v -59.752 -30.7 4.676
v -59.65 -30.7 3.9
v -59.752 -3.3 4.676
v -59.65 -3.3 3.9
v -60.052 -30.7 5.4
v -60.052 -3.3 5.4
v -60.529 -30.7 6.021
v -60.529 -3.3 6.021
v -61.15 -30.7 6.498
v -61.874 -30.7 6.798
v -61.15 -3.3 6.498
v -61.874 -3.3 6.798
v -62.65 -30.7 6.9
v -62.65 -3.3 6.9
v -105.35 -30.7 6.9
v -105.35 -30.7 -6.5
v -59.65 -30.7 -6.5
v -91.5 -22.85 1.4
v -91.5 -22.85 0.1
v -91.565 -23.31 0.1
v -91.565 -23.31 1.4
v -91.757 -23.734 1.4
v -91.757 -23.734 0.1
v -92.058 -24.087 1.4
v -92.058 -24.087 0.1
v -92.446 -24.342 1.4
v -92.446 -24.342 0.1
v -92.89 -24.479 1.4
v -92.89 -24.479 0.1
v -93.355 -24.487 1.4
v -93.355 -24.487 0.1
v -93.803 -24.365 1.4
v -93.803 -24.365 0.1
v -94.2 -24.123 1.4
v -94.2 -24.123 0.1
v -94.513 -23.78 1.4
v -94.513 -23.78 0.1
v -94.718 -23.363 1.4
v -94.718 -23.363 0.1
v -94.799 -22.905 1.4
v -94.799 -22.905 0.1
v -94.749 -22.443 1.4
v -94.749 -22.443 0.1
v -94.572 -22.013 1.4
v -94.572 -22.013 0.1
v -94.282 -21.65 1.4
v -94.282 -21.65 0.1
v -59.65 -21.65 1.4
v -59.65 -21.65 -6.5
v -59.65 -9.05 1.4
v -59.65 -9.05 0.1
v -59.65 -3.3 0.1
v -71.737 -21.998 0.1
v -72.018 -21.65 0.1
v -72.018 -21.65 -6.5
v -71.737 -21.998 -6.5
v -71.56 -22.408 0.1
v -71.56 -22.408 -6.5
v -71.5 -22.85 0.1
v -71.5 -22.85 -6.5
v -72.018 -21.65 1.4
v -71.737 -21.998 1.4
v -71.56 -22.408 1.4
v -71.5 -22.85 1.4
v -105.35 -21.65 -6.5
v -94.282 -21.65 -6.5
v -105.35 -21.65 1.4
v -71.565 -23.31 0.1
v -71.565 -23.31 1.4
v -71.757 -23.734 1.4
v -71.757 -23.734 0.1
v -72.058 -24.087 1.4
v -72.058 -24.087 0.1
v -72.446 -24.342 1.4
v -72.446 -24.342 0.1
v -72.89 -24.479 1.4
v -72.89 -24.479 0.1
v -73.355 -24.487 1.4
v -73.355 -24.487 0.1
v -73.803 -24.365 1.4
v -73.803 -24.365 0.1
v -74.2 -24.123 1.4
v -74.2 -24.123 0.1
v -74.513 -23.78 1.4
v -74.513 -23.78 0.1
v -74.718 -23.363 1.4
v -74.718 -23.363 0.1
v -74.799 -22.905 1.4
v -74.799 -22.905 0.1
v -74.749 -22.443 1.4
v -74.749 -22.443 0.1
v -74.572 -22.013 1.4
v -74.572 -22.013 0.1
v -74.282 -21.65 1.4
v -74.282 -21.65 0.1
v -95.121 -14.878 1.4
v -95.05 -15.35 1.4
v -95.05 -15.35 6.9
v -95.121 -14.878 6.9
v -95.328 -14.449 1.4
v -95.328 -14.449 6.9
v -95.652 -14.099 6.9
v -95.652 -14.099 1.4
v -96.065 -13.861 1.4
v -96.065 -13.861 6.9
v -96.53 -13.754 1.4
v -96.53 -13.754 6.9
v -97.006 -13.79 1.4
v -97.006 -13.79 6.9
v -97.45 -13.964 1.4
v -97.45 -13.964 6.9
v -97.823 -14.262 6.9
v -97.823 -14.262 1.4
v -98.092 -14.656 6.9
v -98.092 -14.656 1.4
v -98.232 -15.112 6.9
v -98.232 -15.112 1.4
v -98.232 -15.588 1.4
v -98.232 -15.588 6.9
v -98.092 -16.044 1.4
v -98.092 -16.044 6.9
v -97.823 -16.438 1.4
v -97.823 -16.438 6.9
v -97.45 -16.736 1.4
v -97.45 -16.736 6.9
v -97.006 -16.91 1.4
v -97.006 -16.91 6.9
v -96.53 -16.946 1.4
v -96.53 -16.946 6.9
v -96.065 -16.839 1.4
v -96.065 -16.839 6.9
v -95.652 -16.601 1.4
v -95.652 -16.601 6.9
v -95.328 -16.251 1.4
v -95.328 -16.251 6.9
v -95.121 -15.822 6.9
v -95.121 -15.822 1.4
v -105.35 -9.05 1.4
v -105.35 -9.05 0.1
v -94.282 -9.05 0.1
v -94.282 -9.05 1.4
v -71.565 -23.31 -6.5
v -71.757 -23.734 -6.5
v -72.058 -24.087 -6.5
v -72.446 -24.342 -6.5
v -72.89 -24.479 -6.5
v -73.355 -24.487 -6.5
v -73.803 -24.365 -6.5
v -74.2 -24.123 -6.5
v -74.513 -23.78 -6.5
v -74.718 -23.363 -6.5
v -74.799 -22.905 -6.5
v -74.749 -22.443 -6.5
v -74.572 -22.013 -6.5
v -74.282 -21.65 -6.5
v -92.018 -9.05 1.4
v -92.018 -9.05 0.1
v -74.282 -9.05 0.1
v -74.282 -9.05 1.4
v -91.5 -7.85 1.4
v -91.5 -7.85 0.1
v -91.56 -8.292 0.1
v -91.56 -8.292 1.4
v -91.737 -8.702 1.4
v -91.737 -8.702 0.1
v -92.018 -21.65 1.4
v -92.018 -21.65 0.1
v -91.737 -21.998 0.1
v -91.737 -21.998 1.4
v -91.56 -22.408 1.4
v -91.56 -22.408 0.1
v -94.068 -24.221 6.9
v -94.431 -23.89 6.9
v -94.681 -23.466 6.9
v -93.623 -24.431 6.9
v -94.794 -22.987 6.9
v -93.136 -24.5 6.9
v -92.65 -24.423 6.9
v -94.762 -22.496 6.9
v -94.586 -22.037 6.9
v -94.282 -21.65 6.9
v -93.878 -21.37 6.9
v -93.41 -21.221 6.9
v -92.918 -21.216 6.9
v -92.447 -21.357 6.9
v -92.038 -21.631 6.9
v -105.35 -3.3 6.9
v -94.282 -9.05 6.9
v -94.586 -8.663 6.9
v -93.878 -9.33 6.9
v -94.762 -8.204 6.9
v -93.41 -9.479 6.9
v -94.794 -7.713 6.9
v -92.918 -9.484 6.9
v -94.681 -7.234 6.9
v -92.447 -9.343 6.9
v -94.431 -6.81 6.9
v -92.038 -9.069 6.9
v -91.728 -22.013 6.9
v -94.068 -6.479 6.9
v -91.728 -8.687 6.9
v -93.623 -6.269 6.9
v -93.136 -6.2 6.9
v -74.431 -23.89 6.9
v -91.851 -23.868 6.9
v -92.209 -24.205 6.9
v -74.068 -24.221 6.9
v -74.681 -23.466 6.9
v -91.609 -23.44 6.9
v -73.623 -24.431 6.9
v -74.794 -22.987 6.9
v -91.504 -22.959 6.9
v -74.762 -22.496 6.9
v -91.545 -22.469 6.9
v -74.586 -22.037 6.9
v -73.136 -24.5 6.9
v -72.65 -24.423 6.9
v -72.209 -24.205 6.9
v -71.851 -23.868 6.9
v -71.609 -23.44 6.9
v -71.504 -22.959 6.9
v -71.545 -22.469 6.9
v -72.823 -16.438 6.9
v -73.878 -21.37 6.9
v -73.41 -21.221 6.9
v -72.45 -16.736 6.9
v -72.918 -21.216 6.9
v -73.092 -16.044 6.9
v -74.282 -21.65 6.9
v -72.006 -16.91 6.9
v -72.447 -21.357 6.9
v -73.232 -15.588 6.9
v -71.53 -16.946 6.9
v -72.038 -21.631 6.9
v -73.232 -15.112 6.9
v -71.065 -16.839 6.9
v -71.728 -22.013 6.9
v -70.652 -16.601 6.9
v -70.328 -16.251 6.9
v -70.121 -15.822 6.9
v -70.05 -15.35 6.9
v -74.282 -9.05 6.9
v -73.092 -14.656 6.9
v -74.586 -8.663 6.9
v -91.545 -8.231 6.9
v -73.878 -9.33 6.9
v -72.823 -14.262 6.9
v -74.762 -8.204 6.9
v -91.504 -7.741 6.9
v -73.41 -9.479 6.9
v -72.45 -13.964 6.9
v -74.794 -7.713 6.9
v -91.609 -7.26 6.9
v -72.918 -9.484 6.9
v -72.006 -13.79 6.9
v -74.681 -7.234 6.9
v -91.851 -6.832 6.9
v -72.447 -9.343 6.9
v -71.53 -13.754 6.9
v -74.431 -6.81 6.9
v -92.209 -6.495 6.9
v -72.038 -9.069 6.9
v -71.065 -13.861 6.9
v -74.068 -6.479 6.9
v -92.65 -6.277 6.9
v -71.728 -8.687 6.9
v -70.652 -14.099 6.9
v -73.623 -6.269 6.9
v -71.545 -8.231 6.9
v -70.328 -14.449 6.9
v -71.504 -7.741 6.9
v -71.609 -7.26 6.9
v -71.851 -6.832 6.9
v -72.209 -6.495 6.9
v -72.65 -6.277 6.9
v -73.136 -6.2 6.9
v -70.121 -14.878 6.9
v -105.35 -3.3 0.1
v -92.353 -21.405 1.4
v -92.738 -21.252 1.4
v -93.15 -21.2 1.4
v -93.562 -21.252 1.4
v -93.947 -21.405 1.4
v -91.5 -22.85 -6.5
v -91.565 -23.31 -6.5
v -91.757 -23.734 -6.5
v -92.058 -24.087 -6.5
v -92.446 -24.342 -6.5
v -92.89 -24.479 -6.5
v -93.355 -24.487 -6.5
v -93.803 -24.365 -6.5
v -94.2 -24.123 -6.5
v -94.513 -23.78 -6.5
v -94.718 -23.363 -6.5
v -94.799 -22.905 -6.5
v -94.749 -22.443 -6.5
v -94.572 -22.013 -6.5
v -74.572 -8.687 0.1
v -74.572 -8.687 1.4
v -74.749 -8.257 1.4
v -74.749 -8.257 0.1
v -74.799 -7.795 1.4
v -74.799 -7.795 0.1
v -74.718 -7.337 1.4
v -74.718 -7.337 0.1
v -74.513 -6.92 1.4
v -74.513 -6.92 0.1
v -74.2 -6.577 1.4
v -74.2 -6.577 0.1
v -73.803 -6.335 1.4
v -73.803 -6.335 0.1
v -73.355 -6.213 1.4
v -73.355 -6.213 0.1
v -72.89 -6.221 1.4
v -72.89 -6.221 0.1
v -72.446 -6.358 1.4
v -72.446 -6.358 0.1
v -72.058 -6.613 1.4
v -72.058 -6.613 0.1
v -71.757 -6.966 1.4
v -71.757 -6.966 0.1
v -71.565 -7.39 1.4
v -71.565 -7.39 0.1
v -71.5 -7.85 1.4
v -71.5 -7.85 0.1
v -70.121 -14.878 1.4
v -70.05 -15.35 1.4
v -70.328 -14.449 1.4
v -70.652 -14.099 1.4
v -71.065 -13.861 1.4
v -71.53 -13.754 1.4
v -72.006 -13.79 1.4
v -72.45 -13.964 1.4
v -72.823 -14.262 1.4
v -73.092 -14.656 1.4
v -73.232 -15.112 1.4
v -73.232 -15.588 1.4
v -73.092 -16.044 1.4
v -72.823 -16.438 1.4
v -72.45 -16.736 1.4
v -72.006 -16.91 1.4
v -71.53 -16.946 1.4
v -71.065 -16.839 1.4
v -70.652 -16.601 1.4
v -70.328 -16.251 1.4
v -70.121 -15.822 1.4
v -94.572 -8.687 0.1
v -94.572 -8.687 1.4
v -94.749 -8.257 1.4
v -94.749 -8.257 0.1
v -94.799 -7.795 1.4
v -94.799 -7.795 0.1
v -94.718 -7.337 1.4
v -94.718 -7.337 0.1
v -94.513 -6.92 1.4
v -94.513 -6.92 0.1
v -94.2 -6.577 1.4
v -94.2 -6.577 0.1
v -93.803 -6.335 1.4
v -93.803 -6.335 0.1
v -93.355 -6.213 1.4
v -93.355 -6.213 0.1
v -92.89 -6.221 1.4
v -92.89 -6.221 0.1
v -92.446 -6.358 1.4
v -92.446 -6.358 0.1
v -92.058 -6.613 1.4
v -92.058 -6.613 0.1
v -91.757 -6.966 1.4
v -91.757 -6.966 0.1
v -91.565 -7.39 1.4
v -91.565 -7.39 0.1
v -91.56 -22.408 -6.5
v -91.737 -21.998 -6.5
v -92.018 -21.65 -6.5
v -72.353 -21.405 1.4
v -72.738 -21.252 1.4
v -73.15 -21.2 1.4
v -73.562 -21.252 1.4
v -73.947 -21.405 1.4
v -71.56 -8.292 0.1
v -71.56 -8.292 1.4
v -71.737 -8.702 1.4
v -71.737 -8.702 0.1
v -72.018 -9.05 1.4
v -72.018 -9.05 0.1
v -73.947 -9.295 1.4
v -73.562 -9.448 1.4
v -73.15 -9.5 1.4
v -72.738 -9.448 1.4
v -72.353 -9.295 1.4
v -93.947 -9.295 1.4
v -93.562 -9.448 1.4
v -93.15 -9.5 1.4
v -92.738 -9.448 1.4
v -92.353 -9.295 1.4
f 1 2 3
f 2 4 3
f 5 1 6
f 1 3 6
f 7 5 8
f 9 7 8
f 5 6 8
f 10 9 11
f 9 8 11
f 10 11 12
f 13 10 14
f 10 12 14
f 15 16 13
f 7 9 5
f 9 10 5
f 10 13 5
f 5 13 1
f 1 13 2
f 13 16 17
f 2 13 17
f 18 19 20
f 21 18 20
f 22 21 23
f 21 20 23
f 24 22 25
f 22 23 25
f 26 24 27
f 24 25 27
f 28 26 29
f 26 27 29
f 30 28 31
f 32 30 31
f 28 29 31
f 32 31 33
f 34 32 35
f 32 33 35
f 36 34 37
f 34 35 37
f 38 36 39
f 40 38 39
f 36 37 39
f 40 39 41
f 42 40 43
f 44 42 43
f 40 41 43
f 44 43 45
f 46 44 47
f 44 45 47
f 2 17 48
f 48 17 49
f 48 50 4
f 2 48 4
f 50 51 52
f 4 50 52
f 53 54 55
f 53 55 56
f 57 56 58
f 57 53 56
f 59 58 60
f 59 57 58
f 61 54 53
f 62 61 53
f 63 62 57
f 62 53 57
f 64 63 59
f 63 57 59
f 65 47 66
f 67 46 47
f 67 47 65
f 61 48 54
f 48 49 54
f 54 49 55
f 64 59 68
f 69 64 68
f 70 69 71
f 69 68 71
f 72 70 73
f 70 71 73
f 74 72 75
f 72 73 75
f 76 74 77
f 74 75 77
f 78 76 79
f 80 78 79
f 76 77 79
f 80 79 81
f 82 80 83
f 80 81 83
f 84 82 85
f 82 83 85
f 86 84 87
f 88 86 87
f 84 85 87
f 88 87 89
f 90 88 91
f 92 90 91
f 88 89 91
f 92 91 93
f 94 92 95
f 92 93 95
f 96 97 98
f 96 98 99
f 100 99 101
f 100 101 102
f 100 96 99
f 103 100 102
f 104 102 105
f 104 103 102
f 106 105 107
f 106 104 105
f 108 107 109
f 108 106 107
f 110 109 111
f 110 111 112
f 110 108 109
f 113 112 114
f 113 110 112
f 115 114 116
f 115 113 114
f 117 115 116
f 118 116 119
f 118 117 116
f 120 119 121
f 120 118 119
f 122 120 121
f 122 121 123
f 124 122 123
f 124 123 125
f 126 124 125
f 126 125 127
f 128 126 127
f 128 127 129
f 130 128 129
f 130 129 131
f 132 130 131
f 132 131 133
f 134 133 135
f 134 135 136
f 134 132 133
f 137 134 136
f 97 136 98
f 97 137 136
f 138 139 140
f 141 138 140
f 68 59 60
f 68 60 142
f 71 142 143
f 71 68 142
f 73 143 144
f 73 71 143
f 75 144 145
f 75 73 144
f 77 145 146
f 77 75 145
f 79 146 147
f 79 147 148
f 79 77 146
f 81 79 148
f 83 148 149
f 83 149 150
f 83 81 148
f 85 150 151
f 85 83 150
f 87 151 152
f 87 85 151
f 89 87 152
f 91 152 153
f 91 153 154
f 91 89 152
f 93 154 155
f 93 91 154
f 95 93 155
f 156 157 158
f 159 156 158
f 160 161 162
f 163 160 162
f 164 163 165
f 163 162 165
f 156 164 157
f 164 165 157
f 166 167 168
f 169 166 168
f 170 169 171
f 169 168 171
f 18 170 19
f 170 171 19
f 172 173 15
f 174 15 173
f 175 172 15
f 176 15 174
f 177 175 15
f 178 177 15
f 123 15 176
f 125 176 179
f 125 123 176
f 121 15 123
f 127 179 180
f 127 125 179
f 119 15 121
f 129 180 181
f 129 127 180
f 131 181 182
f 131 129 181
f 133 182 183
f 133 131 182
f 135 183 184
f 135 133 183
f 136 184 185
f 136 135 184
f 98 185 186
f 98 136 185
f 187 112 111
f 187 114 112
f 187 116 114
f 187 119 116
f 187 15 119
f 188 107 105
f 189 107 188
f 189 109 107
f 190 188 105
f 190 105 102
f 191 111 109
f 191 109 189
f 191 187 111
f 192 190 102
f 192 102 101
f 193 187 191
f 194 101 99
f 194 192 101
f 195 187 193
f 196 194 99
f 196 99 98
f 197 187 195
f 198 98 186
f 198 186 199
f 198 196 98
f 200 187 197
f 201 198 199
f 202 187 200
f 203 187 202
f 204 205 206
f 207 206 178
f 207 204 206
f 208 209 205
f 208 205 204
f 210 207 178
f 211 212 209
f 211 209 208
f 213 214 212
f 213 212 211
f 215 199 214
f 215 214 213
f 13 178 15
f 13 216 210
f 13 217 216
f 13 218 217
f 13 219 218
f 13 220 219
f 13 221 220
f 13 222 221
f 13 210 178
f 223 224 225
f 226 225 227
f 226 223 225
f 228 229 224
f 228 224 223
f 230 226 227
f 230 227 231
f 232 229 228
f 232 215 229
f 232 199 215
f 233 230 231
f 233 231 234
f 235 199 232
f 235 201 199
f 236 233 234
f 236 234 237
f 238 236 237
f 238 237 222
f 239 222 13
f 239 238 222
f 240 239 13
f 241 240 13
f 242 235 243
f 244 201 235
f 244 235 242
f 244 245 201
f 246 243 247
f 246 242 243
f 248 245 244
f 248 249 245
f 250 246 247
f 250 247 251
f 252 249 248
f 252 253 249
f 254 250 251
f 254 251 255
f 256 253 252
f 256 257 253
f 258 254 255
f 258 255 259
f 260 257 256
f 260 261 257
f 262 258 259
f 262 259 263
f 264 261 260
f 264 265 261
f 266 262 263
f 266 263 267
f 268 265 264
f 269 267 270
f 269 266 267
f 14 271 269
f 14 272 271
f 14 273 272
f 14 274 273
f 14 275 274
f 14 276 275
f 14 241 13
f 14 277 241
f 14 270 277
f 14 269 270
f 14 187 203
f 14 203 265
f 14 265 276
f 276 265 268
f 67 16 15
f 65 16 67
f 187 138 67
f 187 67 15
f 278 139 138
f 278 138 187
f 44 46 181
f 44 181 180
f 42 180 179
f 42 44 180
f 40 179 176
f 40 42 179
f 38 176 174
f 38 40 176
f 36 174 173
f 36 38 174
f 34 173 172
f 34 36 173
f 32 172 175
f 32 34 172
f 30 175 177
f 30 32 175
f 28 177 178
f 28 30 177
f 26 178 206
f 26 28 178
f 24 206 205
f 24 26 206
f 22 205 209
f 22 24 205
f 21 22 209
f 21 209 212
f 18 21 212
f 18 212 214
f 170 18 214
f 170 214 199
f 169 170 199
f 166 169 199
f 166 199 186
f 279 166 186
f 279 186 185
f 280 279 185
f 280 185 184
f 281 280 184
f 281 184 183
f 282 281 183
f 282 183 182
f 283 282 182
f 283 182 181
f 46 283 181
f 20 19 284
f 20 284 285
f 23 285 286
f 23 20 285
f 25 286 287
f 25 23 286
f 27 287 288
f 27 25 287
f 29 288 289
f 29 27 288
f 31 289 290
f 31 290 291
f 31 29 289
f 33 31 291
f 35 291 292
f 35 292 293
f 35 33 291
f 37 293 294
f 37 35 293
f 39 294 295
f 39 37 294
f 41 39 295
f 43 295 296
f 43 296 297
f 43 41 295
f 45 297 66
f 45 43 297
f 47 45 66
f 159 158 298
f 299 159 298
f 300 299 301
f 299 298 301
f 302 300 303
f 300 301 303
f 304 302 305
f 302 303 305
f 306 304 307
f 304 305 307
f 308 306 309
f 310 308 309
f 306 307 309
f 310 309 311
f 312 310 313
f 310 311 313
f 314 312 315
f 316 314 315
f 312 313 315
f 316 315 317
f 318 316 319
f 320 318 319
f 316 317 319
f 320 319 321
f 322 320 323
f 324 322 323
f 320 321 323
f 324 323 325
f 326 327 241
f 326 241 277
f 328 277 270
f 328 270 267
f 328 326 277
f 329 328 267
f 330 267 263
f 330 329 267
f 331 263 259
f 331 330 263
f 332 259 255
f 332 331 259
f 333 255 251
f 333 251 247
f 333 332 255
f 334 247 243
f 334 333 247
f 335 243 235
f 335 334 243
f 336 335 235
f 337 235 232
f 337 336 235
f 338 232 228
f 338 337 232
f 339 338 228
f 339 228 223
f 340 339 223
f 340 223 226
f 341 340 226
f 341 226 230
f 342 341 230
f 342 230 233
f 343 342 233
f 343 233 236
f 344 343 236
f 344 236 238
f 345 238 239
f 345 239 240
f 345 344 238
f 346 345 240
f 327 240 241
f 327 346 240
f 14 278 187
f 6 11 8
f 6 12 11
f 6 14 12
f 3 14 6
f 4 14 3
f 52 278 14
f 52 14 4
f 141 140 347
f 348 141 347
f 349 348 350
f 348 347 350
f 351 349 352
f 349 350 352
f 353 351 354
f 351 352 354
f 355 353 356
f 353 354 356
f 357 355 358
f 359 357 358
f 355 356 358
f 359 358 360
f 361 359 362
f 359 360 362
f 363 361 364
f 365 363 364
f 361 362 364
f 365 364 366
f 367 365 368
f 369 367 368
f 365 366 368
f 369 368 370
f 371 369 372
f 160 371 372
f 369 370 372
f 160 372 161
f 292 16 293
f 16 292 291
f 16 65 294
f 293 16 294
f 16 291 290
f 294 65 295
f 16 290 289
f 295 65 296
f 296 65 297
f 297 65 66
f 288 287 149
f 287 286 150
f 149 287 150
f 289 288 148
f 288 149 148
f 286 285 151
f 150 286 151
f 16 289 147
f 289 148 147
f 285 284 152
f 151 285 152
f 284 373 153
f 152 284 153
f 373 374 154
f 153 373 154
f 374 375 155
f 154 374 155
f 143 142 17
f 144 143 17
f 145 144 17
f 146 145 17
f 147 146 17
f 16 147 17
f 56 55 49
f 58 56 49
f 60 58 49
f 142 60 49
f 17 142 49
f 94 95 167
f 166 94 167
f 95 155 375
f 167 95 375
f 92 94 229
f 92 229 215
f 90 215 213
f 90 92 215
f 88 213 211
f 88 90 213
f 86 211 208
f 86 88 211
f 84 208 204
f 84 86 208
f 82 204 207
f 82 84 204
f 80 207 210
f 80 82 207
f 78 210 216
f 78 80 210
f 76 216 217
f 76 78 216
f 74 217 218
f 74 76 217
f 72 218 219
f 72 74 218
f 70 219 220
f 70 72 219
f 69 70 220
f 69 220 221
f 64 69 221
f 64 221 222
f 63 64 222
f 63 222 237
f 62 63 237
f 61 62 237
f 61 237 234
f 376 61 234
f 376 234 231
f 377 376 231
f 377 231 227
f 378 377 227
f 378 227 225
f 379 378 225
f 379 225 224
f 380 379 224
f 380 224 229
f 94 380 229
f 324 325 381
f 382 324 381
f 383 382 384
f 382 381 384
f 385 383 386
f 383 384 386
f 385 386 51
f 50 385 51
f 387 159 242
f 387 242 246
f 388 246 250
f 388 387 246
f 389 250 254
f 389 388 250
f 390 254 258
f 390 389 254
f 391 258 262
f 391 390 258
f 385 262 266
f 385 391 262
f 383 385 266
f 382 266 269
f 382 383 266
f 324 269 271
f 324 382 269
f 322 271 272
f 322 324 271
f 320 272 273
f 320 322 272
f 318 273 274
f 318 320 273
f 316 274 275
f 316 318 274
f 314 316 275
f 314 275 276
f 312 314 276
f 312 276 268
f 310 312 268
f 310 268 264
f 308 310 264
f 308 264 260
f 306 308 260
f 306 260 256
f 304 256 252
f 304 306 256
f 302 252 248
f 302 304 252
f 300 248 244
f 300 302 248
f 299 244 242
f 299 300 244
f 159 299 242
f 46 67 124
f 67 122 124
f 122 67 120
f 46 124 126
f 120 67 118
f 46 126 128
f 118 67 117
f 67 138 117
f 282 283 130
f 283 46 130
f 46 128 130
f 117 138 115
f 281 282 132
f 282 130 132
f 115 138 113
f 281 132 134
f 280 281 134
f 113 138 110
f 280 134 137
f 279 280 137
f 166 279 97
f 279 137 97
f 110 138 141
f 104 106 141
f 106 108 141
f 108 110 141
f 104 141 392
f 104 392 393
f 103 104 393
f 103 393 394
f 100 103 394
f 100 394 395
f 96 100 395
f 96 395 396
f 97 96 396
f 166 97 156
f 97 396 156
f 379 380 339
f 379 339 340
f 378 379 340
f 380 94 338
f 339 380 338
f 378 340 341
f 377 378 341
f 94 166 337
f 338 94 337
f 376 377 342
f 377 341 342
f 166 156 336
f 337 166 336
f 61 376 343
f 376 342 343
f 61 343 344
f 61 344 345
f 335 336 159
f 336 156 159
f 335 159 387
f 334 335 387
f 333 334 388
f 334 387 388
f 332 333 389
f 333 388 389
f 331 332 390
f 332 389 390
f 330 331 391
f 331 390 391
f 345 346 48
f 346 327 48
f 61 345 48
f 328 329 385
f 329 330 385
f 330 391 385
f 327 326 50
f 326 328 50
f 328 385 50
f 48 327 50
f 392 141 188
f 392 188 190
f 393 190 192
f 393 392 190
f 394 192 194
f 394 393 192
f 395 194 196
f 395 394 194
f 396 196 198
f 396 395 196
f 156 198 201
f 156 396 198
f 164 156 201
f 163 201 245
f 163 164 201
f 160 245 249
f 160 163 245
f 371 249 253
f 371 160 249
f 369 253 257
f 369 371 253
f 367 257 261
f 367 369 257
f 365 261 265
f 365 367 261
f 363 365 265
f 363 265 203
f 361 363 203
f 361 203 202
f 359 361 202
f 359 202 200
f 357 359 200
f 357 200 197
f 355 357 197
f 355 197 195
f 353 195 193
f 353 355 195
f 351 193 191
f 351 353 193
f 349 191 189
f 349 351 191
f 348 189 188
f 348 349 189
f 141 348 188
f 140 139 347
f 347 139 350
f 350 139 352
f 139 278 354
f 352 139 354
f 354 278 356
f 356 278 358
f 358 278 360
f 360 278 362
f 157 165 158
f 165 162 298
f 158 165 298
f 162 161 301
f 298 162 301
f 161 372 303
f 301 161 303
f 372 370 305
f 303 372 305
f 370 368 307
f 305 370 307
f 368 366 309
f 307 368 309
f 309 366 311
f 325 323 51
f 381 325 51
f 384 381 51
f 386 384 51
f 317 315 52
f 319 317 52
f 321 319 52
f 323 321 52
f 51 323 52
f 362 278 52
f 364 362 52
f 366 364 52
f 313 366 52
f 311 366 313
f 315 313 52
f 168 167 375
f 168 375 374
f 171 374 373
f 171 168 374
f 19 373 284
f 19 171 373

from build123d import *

# Parameters (mm, degrees)
SALIENTE_EXTRUIR1_START      = 0.1
SALIENTE_EXTRUIR1_DEPTH      = 1.3
SALIENTE_EXTRUIR2_START      = 0.1
SALIENTE_EXTRUIR2_DEPTH      = 1.3
SALIENTE_EXTRUIR2_DEPTH_BACK = 6.6
CROQUIS2_W                   = 45.7
CROQUIS2_H                   = 27.4
CROQUIS2_R                   = 1.65
CROQUIS2_R_2                 = 1.6
SALIENTE_EXTRUIR3_DEPTH      = 5.5
REDONDEO1_R                  = 3


with BuildPart() as part:
    # Croquis1 → Saliente-Extruir1 (new body)
    with BuildSketch(Plane.XY.offset(SALIENTE_EXTRUIR1_START)):
        with BuildLine():
            Line((-105.35, -3.3), (-105.35, -9.05))
            Line((-105.35, -9.05), (-94.282475165, -9.05))
            ThreePointArc((-94.282475165, -9.05), (-93.803420224, -6.334895379), (-91.5, -7.85))
            ThreePointArc((-91.5, -7.85), (-91.634895379, -8.503420224), (-92.017524835, -9.05))
            Line((-92.017524835, -9.05), (-74.282475165, -9.05))
            ThreePointArc((-74.282475165, -9.05), (-73.803420224, -6.334895379), (-71.5, -7.85))
            ThreePointArc((-71.5, -7.85), (-71.634895379, -8.503420224), (-72.017524835, -9.05))
            Line((-72.017524835, -9.05), (-59.65, -9.05))
            Line((-59.65, -9.05), (-59.65, -3.3))
            Line((-59.65, -3.3), (-105.35, -3.3))
        make_face()
    extrude(amount=SALIENTE_EXTRUIR1_DEPTH)



with BuildPart() as body_2:
    # Croquis1<3> → Saliente-Extruir2 (new, two sides)
    with BuildSketch(Plane.XY.offset(SALIENTE_EXTRUIR2_START)) as saliente_extruir2_sk:
        with BuildLine():
            Line((-105.35, -21.65), (-105.35, -30.7))
            Line((-105.35, -30.7), (-59.65, -30.7))
            Line((-59.65, -30.7), (-59.65, -21.65))
            Line((-59.65, -21.65), (-72.017510495, -21.65))
            ThreePointArc((-72.017510495, -21.65), (-71.634891475, -22.196575296), (-71.5, -22.849986467))
            ThreePointArc((-71.5, -22.849986467), (-73.803411171, -24.365094992), (-74.282489505, -21.65))
            Line((-74.282489505, -21.65), (-92.017510495, -21.65))
            ThreePointArc((-92.017510495, -21.65), (-91.634891475, -22.196575296), (-91.5, -22.849986467))
            ThreePointArc((-91.5, -22.849986467), (-93.803411171, -24.365094992), (-94.282489505, -21.65))
            Line((-94.282489505, -21.65), (-105.35, -21.65))
        make_face()
    extrude(amount=SALIENTE_EXTRUIR2_DEPTH)
    extrude(saliente_extruir2_sk.sketch, amount=-SALIENTE_EXTRUIR2_DEPTH_BACK)


with BuildPart() as part_1:
    add(part.part)

    add(body_2.part)  # Saliente-Extruir3 merges body 2
    # Croquis2 → Saliente-Extruir3 (add)
    with BuildSketch(Plane.XY.offset(1.4)):
        with Locations((-82.5, -17)):
            Rectangle(CROQUIS2_W, CROQUIS2_H)
        with Locations(Location((-93.15, -7.85, 0), (0, 0, 226.658241773))):
            Circle(CROQUIS2_R, mode=Mode.SUBTRACT)
        with Locations(Location((-73.15, -7.85, 0), (0, 0, 226.658241773))):
            Circle(CROQUIS2_R, mode=Mode.SUBTRACT)
        with Locations(Location((-93.15, -22.849986467, 0), (0, 0, 133.342442907))):
            Circle(CROQUIS2_R, mode=Mode.SUBTRACT)
        with Locations(Location((-73.15, -22.849986467, 0), (0, 0, 133.342442907))):
            Circle(CROQUIS2_R, mode=Mode.SUBTRACT)
        with Locations((-96.65, -15.35)):
            Circle(CROQUIS2_R_2, mode=Mode.SUBTRACT)
        with Locations((-71.65, -15.35)):
            Circle(CROQUIS2_R_2, mode=Mode.SUBTRACT)
    extrude(amount=SALIENTE_EXTRUIR3_DEPTH)

    # Redondeo1
    redondeo1_edges = [part_1.edges().sort_by_distance(p)[0] for p in [
        (-59.65, -17, 6.9),
    ]]
    fillet(redondeo1_edges, radius=REDONDEO1_R)


solid = part_1.part
